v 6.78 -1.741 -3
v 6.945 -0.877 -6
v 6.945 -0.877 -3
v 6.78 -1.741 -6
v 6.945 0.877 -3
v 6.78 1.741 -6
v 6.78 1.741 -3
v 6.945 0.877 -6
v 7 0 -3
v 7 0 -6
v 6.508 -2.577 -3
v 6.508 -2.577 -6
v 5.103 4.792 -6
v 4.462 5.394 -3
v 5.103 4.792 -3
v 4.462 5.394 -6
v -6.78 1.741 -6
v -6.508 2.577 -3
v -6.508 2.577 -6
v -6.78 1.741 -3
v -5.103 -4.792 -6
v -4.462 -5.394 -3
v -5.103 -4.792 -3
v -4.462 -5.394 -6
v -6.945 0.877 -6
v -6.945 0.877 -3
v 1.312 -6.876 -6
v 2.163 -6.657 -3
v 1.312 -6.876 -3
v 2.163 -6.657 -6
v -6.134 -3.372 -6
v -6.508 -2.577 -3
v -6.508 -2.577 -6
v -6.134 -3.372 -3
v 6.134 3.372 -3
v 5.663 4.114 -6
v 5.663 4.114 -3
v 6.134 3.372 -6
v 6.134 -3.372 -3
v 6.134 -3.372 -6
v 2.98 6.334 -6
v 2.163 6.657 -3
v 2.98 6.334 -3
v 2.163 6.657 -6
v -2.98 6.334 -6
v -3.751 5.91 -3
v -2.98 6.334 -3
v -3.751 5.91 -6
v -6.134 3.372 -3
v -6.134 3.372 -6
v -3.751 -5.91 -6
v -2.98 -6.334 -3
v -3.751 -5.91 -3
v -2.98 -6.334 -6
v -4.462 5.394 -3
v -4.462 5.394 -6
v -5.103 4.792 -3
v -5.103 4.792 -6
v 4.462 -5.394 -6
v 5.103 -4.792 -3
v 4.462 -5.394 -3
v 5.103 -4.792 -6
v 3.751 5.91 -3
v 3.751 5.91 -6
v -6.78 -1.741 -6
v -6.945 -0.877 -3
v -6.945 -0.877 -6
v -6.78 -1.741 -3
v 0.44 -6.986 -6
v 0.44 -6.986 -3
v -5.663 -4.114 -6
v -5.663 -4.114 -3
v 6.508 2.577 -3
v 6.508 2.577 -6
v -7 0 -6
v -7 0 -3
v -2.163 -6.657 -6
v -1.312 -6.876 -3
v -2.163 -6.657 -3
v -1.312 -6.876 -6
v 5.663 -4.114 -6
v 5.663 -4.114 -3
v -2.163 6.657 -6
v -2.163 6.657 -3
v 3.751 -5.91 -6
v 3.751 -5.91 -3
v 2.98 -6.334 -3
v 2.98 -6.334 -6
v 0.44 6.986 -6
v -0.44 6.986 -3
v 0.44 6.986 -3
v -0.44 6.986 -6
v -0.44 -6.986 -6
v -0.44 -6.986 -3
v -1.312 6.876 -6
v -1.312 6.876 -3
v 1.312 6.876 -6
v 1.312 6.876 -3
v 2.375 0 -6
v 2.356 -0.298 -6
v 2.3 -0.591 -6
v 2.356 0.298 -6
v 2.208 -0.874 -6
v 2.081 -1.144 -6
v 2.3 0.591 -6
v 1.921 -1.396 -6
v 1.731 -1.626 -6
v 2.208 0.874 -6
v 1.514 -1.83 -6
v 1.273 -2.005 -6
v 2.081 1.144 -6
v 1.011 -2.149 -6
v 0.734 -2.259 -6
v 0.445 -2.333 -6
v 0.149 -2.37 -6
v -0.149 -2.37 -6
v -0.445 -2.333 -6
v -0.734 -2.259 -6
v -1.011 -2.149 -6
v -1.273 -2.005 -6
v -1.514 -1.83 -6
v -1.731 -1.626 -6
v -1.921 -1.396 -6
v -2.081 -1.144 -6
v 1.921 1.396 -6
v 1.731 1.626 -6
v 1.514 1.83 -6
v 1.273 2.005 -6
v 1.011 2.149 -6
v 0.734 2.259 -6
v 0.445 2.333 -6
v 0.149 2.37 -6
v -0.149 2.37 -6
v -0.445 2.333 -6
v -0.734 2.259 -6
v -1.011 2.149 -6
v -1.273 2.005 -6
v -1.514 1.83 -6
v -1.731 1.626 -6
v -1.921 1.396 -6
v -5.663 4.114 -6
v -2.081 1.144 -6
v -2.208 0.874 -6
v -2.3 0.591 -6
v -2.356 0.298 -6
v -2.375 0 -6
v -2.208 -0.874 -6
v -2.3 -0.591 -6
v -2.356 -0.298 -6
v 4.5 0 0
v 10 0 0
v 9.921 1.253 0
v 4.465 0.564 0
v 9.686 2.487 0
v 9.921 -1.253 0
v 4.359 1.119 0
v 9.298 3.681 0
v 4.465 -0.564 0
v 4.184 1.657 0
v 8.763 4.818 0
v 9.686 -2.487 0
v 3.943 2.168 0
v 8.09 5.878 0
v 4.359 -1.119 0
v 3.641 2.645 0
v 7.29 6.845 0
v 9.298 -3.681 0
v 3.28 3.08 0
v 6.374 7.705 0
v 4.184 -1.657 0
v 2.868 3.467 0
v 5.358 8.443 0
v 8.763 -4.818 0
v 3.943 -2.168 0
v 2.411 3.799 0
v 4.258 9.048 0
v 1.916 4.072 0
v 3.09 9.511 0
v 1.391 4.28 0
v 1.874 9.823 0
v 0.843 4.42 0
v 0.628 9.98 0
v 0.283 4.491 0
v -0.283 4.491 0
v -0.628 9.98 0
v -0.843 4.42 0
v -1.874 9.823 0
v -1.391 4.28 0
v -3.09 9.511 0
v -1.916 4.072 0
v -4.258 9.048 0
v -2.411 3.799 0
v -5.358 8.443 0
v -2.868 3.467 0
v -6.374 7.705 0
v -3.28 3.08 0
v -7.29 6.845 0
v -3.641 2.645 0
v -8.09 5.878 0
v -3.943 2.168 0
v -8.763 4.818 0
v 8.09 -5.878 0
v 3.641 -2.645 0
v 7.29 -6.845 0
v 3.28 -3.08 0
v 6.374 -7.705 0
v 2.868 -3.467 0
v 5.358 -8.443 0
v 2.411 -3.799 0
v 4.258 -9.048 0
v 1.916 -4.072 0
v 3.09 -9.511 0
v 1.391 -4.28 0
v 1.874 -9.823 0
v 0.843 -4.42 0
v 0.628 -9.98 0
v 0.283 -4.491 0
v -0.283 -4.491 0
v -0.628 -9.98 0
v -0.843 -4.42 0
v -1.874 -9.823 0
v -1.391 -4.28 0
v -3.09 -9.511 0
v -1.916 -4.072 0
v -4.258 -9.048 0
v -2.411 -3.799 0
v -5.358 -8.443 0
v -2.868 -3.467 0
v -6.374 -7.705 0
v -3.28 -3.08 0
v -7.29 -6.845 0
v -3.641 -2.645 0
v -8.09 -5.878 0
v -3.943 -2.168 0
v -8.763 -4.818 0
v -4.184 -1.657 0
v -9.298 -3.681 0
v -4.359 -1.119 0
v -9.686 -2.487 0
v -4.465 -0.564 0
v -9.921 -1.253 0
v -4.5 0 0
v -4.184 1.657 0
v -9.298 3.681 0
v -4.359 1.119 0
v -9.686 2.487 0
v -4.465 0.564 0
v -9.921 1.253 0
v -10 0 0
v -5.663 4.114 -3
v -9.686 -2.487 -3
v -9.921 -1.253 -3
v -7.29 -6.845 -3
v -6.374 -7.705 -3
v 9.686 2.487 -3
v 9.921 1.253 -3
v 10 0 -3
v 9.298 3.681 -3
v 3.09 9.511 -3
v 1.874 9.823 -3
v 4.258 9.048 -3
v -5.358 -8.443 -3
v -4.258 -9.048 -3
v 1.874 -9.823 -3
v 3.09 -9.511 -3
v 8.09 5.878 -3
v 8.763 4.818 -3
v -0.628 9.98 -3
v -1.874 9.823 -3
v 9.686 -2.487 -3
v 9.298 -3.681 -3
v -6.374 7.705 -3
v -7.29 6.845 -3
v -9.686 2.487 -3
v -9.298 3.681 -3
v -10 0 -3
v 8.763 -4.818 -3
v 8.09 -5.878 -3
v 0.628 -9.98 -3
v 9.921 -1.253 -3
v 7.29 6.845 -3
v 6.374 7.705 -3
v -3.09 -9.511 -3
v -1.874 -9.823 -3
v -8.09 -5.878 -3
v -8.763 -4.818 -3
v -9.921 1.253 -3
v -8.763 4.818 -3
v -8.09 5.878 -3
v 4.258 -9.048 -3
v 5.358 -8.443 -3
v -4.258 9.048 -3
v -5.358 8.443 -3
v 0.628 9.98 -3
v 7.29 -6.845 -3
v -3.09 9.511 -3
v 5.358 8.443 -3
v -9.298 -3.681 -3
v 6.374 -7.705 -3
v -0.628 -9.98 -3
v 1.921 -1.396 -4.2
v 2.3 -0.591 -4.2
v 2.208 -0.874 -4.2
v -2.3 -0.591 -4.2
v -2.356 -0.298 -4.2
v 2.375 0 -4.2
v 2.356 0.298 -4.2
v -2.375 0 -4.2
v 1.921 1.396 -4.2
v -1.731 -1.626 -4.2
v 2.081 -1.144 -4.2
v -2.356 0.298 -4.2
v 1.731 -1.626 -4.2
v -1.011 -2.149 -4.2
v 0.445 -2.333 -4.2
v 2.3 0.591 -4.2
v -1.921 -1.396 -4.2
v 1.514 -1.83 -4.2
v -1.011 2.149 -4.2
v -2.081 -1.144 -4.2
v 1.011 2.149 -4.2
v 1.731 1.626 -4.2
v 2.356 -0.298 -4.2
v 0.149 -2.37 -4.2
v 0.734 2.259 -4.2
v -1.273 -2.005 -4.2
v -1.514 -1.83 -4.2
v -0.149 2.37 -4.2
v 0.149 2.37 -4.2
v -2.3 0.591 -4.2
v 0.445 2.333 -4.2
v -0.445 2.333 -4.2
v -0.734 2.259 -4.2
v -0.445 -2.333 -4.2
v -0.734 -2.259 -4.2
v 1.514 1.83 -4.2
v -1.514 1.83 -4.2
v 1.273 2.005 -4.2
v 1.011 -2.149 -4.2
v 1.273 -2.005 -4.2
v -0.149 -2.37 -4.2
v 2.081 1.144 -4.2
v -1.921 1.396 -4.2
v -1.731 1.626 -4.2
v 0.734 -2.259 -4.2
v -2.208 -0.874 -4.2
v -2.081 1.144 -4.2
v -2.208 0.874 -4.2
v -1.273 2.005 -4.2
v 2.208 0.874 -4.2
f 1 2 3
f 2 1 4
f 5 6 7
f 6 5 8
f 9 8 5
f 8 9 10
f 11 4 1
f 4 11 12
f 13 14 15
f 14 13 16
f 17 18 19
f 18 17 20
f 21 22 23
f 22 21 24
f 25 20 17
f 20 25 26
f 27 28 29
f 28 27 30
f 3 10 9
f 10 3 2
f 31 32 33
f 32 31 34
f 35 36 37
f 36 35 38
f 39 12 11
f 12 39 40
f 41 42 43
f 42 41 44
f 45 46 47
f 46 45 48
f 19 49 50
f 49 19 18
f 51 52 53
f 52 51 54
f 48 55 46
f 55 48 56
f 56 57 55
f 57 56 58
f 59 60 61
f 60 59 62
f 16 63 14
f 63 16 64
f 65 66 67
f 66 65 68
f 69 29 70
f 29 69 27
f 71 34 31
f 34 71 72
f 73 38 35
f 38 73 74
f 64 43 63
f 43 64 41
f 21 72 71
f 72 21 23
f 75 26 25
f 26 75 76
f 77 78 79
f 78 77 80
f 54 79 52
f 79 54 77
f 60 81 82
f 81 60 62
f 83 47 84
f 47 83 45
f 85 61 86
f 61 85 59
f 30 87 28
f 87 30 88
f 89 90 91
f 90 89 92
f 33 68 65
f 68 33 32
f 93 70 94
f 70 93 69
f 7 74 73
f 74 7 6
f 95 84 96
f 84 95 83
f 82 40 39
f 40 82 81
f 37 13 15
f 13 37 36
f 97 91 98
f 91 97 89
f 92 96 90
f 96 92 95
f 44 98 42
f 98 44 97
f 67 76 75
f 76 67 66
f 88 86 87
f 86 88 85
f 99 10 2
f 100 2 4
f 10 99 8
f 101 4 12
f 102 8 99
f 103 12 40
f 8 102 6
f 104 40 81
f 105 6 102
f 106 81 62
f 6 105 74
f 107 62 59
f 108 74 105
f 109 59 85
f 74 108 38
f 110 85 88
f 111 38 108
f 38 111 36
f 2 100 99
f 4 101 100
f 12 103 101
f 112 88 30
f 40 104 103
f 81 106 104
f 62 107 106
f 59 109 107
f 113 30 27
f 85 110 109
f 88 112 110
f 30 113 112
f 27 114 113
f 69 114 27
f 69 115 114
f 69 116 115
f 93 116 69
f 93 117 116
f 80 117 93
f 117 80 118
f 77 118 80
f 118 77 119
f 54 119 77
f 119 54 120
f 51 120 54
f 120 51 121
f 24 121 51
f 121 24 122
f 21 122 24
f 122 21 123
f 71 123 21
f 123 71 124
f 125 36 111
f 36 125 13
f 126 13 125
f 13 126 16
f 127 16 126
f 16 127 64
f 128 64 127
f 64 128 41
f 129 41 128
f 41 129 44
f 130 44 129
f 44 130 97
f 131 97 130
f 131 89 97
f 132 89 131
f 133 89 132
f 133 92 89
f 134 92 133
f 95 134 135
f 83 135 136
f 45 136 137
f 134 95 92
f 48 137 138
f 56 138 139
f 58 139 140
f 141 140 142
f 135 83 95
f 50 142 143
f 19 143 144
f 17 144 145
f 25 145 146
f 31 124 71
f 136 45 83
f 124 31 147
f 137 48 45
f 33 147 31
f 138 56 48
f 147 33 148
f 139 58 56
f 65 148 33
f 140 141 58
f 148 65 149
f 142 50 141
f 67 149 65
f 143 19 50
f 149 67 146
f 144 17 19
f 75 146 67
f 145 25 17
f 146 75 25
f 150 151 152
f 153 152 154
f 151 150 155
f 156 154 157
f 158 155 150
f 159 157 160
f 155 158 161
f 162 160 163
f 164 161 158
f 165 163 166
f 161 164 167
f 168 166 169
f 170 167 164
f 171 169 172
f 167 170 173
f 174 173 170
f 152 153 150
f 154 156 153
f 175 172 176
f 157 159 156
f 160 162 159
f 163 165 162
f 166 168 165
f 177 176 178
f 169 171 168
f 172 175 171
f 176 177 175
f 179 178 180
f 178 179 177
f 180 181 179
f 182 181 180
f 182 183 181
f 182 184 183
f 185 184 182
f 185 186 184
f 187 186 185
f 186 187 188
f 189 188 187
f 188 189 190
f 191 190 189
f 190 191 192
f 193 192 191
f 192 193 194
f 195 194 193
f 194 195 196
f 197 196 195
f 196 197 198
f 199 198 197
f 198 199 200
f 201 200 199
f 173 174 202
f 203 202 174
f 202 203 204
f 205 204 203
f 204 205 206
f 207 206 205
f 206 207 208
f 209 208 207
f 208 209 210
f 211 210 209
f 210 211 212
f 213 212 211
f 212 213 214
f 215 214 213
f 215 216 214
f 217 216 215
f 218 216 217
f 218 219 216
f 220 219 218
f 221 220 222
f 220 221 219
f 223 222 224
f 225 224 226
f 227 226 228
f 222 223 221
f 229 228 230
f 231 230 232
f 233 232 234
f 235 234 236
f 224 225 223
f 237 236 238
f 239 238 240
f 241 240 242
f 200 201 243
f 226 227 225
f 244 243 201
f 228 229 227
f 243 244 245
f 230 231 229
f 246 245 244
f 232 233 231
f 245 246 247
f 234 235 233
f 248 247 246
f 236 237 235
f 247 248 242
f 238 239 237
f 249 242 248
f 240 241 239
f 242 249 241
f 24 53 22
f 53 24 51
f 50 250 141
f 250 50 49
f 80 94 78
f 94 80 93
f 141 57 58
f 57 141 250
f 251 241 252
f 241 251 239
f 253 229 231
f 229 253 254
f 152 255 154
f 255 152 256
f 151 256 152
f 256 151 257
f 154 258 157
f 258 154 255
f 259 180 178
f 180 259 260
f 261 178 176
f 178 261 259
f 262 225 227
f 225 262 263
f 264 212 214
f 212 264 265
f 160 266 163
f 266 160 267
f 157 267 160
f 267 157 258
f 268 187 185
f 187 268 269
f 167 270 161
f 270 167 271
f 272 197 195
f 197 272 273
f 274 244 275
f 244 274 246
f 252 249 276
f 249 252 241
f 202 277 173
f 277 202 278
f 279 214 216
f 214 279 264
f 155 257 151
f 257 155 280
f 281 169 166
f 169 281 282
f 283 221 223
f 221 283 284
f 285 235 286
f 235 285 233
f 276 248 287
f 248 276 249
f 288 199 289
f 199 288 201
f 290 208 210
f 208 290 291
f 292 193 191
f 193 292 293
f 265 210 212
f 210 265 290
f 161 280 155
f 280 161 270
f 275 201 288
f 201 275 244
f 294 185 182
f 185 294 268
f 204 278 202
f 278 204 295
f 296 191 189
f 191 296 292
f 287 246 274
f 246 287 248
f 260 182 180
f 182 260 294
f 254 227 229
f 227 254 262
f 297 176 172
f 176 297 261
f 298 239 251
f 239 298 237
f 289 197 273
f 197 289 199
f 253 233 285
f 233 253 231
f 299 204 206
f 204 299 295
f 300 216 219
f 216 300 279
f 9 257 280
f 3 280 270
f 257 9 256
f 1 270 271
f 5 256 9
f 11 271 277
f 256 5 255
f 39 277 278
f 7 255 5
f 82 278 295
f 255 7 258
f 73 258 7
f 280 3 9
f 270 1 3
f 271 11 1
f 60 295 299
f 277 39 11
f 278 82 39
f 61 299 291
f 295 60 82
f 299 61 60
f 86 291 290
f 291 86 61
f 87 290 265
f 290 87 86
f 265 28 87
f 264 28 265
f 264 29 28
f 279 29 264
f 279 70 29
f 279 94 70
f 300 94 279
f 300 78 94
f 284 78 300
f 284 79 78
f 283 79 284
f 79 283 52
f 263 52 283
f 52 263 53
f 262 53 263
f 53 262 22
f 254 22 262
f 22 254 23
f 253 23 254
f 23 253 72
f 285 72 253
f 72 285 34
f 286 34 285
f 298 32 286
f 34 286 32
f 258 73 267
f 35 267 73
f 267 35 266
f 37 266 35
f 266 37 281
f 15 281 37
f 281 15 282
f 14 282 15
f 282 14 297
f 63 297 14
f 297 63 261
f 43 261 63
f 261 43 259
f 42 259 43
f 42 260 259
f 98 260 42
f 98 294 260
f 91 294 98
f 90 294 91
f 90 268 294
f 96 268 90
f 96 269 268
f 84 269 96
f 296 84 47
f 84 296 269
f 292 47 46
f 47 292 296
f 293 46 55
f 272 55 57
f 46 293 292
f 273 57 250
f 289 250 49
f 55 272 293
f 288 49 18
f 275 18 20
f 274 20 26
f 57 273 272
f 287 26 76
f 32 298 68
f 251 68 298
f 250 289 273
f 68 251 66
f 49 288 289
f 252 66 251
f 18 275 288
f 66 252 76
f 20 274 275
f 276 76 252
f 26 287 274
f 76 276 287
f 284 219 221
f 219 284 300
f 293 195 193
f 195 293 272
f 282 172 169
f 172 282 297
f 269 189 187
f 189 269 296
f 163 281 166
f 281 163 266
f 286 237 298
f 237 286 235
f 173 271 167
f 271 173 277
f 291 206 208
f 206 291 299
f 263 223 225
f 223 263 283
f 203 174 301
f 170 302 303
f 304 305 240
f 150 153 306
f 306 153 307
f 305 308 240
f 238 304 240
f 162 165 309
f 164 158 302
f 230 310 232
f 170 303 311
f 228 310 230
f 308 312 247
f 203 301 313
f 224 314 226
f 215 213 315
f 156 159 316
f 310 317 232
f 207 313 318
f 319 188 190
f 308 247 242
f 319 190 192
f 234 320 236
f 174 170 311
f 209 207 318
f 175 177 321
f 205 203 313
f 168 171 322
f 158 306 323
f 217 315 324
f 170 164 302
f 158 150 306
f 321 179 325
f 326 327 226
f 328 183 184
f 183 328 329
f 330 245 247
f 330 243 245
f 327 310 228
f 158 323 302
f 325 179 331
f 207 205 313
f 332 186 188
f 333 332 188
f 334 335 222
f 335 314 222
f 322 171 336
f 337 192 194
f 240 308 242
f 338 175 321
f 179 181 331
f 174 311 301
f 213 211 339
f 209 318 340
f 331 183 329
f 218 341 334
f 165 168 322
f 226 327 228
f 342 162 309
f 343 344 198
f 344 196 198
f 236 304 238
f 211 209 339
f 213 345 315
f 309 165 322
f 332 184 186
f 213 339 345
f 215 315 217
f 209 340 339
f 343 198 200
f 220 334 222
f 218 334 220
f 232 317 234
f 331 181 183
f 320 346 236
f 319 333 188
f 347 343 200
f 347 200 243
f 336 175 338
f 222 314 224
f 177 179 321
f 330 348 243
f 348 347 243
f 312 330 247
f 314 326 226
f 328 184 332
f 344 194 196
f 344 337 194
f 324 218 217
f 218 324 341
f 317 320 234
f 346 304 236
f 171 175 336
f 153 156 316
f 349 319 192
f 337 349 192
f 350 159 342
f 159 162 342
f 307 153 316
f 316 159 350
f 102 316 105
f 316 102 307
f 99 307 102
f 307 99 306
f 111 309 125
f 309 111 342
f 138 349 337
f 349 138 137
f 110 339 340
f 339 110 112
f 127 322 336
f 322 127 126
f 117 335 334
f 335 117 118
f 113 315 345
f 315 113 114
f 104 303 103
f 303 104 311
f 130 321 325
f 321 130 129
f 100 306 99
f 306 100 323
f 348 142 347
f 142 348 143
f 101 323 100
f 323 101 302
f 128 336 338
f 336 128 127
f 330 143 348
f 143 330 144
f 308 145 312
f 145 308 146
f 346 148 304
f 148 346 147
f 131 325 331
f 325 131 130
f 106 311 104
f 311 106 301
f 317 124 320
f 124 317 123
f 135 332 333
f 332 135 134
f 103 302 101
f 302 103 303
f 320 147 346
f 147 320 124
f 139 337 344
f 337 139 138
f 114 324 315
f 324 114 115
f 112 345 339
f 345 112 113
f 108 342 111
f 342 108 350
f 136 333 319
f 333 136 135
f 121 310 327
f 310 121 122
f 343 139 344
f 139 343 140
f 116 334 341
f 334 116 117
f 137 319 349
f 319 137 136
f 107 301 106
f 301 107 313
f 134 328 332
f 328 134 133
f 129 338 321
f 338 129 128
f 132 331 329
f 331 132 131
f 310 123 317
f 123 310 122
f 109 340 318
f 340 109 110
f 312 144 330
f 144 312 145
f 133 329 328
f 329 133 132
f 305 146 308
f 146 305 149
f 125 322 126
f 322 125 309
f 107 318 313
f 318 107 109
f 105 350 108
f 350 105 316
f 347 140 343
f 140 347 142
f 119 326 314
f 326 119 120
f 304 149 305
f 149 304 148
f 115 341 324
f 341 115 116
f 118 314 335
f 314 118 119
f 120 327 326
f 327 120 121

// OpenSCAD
$fn = 50;


difference() {
	union() {
		translate(v = [0, 0, -6.0000000000]) {
			cylinder(h = 6, r = 7.0000000000);
		}
		translate(v = [0, 0, -3.0000000000]) {
			cylinder(h = 3, r = 10.0000000000);
		}
	}
	union() {
		translate(v = [0, 0, 0]) {
			rotate(a = [0, 0, 0]) {
				difference() {
					union() {
						#translate(v = [0, 0, -6.0000000000]) {
							cylinder(h = 6, r = 2.2500000000);
						}
						#translate(v = [0, 0, -4.2000000000]) {
							cylinder(h = 4.2000000000, r = 7.0000000000, r1 = 2.3750000000, r2 = 4.5000000000);
						}
						#translate(v = [0, 0, -6.0000000000]) {
							cylinder(h = 6, r = 2.3750000000);
						}
						#translate(v = [0, 0, -6.0000000000]) {
							cylinder(h = 6, r = 2.2500000000);
						}
					}
					union();
				}
			}
		}
	}
}
